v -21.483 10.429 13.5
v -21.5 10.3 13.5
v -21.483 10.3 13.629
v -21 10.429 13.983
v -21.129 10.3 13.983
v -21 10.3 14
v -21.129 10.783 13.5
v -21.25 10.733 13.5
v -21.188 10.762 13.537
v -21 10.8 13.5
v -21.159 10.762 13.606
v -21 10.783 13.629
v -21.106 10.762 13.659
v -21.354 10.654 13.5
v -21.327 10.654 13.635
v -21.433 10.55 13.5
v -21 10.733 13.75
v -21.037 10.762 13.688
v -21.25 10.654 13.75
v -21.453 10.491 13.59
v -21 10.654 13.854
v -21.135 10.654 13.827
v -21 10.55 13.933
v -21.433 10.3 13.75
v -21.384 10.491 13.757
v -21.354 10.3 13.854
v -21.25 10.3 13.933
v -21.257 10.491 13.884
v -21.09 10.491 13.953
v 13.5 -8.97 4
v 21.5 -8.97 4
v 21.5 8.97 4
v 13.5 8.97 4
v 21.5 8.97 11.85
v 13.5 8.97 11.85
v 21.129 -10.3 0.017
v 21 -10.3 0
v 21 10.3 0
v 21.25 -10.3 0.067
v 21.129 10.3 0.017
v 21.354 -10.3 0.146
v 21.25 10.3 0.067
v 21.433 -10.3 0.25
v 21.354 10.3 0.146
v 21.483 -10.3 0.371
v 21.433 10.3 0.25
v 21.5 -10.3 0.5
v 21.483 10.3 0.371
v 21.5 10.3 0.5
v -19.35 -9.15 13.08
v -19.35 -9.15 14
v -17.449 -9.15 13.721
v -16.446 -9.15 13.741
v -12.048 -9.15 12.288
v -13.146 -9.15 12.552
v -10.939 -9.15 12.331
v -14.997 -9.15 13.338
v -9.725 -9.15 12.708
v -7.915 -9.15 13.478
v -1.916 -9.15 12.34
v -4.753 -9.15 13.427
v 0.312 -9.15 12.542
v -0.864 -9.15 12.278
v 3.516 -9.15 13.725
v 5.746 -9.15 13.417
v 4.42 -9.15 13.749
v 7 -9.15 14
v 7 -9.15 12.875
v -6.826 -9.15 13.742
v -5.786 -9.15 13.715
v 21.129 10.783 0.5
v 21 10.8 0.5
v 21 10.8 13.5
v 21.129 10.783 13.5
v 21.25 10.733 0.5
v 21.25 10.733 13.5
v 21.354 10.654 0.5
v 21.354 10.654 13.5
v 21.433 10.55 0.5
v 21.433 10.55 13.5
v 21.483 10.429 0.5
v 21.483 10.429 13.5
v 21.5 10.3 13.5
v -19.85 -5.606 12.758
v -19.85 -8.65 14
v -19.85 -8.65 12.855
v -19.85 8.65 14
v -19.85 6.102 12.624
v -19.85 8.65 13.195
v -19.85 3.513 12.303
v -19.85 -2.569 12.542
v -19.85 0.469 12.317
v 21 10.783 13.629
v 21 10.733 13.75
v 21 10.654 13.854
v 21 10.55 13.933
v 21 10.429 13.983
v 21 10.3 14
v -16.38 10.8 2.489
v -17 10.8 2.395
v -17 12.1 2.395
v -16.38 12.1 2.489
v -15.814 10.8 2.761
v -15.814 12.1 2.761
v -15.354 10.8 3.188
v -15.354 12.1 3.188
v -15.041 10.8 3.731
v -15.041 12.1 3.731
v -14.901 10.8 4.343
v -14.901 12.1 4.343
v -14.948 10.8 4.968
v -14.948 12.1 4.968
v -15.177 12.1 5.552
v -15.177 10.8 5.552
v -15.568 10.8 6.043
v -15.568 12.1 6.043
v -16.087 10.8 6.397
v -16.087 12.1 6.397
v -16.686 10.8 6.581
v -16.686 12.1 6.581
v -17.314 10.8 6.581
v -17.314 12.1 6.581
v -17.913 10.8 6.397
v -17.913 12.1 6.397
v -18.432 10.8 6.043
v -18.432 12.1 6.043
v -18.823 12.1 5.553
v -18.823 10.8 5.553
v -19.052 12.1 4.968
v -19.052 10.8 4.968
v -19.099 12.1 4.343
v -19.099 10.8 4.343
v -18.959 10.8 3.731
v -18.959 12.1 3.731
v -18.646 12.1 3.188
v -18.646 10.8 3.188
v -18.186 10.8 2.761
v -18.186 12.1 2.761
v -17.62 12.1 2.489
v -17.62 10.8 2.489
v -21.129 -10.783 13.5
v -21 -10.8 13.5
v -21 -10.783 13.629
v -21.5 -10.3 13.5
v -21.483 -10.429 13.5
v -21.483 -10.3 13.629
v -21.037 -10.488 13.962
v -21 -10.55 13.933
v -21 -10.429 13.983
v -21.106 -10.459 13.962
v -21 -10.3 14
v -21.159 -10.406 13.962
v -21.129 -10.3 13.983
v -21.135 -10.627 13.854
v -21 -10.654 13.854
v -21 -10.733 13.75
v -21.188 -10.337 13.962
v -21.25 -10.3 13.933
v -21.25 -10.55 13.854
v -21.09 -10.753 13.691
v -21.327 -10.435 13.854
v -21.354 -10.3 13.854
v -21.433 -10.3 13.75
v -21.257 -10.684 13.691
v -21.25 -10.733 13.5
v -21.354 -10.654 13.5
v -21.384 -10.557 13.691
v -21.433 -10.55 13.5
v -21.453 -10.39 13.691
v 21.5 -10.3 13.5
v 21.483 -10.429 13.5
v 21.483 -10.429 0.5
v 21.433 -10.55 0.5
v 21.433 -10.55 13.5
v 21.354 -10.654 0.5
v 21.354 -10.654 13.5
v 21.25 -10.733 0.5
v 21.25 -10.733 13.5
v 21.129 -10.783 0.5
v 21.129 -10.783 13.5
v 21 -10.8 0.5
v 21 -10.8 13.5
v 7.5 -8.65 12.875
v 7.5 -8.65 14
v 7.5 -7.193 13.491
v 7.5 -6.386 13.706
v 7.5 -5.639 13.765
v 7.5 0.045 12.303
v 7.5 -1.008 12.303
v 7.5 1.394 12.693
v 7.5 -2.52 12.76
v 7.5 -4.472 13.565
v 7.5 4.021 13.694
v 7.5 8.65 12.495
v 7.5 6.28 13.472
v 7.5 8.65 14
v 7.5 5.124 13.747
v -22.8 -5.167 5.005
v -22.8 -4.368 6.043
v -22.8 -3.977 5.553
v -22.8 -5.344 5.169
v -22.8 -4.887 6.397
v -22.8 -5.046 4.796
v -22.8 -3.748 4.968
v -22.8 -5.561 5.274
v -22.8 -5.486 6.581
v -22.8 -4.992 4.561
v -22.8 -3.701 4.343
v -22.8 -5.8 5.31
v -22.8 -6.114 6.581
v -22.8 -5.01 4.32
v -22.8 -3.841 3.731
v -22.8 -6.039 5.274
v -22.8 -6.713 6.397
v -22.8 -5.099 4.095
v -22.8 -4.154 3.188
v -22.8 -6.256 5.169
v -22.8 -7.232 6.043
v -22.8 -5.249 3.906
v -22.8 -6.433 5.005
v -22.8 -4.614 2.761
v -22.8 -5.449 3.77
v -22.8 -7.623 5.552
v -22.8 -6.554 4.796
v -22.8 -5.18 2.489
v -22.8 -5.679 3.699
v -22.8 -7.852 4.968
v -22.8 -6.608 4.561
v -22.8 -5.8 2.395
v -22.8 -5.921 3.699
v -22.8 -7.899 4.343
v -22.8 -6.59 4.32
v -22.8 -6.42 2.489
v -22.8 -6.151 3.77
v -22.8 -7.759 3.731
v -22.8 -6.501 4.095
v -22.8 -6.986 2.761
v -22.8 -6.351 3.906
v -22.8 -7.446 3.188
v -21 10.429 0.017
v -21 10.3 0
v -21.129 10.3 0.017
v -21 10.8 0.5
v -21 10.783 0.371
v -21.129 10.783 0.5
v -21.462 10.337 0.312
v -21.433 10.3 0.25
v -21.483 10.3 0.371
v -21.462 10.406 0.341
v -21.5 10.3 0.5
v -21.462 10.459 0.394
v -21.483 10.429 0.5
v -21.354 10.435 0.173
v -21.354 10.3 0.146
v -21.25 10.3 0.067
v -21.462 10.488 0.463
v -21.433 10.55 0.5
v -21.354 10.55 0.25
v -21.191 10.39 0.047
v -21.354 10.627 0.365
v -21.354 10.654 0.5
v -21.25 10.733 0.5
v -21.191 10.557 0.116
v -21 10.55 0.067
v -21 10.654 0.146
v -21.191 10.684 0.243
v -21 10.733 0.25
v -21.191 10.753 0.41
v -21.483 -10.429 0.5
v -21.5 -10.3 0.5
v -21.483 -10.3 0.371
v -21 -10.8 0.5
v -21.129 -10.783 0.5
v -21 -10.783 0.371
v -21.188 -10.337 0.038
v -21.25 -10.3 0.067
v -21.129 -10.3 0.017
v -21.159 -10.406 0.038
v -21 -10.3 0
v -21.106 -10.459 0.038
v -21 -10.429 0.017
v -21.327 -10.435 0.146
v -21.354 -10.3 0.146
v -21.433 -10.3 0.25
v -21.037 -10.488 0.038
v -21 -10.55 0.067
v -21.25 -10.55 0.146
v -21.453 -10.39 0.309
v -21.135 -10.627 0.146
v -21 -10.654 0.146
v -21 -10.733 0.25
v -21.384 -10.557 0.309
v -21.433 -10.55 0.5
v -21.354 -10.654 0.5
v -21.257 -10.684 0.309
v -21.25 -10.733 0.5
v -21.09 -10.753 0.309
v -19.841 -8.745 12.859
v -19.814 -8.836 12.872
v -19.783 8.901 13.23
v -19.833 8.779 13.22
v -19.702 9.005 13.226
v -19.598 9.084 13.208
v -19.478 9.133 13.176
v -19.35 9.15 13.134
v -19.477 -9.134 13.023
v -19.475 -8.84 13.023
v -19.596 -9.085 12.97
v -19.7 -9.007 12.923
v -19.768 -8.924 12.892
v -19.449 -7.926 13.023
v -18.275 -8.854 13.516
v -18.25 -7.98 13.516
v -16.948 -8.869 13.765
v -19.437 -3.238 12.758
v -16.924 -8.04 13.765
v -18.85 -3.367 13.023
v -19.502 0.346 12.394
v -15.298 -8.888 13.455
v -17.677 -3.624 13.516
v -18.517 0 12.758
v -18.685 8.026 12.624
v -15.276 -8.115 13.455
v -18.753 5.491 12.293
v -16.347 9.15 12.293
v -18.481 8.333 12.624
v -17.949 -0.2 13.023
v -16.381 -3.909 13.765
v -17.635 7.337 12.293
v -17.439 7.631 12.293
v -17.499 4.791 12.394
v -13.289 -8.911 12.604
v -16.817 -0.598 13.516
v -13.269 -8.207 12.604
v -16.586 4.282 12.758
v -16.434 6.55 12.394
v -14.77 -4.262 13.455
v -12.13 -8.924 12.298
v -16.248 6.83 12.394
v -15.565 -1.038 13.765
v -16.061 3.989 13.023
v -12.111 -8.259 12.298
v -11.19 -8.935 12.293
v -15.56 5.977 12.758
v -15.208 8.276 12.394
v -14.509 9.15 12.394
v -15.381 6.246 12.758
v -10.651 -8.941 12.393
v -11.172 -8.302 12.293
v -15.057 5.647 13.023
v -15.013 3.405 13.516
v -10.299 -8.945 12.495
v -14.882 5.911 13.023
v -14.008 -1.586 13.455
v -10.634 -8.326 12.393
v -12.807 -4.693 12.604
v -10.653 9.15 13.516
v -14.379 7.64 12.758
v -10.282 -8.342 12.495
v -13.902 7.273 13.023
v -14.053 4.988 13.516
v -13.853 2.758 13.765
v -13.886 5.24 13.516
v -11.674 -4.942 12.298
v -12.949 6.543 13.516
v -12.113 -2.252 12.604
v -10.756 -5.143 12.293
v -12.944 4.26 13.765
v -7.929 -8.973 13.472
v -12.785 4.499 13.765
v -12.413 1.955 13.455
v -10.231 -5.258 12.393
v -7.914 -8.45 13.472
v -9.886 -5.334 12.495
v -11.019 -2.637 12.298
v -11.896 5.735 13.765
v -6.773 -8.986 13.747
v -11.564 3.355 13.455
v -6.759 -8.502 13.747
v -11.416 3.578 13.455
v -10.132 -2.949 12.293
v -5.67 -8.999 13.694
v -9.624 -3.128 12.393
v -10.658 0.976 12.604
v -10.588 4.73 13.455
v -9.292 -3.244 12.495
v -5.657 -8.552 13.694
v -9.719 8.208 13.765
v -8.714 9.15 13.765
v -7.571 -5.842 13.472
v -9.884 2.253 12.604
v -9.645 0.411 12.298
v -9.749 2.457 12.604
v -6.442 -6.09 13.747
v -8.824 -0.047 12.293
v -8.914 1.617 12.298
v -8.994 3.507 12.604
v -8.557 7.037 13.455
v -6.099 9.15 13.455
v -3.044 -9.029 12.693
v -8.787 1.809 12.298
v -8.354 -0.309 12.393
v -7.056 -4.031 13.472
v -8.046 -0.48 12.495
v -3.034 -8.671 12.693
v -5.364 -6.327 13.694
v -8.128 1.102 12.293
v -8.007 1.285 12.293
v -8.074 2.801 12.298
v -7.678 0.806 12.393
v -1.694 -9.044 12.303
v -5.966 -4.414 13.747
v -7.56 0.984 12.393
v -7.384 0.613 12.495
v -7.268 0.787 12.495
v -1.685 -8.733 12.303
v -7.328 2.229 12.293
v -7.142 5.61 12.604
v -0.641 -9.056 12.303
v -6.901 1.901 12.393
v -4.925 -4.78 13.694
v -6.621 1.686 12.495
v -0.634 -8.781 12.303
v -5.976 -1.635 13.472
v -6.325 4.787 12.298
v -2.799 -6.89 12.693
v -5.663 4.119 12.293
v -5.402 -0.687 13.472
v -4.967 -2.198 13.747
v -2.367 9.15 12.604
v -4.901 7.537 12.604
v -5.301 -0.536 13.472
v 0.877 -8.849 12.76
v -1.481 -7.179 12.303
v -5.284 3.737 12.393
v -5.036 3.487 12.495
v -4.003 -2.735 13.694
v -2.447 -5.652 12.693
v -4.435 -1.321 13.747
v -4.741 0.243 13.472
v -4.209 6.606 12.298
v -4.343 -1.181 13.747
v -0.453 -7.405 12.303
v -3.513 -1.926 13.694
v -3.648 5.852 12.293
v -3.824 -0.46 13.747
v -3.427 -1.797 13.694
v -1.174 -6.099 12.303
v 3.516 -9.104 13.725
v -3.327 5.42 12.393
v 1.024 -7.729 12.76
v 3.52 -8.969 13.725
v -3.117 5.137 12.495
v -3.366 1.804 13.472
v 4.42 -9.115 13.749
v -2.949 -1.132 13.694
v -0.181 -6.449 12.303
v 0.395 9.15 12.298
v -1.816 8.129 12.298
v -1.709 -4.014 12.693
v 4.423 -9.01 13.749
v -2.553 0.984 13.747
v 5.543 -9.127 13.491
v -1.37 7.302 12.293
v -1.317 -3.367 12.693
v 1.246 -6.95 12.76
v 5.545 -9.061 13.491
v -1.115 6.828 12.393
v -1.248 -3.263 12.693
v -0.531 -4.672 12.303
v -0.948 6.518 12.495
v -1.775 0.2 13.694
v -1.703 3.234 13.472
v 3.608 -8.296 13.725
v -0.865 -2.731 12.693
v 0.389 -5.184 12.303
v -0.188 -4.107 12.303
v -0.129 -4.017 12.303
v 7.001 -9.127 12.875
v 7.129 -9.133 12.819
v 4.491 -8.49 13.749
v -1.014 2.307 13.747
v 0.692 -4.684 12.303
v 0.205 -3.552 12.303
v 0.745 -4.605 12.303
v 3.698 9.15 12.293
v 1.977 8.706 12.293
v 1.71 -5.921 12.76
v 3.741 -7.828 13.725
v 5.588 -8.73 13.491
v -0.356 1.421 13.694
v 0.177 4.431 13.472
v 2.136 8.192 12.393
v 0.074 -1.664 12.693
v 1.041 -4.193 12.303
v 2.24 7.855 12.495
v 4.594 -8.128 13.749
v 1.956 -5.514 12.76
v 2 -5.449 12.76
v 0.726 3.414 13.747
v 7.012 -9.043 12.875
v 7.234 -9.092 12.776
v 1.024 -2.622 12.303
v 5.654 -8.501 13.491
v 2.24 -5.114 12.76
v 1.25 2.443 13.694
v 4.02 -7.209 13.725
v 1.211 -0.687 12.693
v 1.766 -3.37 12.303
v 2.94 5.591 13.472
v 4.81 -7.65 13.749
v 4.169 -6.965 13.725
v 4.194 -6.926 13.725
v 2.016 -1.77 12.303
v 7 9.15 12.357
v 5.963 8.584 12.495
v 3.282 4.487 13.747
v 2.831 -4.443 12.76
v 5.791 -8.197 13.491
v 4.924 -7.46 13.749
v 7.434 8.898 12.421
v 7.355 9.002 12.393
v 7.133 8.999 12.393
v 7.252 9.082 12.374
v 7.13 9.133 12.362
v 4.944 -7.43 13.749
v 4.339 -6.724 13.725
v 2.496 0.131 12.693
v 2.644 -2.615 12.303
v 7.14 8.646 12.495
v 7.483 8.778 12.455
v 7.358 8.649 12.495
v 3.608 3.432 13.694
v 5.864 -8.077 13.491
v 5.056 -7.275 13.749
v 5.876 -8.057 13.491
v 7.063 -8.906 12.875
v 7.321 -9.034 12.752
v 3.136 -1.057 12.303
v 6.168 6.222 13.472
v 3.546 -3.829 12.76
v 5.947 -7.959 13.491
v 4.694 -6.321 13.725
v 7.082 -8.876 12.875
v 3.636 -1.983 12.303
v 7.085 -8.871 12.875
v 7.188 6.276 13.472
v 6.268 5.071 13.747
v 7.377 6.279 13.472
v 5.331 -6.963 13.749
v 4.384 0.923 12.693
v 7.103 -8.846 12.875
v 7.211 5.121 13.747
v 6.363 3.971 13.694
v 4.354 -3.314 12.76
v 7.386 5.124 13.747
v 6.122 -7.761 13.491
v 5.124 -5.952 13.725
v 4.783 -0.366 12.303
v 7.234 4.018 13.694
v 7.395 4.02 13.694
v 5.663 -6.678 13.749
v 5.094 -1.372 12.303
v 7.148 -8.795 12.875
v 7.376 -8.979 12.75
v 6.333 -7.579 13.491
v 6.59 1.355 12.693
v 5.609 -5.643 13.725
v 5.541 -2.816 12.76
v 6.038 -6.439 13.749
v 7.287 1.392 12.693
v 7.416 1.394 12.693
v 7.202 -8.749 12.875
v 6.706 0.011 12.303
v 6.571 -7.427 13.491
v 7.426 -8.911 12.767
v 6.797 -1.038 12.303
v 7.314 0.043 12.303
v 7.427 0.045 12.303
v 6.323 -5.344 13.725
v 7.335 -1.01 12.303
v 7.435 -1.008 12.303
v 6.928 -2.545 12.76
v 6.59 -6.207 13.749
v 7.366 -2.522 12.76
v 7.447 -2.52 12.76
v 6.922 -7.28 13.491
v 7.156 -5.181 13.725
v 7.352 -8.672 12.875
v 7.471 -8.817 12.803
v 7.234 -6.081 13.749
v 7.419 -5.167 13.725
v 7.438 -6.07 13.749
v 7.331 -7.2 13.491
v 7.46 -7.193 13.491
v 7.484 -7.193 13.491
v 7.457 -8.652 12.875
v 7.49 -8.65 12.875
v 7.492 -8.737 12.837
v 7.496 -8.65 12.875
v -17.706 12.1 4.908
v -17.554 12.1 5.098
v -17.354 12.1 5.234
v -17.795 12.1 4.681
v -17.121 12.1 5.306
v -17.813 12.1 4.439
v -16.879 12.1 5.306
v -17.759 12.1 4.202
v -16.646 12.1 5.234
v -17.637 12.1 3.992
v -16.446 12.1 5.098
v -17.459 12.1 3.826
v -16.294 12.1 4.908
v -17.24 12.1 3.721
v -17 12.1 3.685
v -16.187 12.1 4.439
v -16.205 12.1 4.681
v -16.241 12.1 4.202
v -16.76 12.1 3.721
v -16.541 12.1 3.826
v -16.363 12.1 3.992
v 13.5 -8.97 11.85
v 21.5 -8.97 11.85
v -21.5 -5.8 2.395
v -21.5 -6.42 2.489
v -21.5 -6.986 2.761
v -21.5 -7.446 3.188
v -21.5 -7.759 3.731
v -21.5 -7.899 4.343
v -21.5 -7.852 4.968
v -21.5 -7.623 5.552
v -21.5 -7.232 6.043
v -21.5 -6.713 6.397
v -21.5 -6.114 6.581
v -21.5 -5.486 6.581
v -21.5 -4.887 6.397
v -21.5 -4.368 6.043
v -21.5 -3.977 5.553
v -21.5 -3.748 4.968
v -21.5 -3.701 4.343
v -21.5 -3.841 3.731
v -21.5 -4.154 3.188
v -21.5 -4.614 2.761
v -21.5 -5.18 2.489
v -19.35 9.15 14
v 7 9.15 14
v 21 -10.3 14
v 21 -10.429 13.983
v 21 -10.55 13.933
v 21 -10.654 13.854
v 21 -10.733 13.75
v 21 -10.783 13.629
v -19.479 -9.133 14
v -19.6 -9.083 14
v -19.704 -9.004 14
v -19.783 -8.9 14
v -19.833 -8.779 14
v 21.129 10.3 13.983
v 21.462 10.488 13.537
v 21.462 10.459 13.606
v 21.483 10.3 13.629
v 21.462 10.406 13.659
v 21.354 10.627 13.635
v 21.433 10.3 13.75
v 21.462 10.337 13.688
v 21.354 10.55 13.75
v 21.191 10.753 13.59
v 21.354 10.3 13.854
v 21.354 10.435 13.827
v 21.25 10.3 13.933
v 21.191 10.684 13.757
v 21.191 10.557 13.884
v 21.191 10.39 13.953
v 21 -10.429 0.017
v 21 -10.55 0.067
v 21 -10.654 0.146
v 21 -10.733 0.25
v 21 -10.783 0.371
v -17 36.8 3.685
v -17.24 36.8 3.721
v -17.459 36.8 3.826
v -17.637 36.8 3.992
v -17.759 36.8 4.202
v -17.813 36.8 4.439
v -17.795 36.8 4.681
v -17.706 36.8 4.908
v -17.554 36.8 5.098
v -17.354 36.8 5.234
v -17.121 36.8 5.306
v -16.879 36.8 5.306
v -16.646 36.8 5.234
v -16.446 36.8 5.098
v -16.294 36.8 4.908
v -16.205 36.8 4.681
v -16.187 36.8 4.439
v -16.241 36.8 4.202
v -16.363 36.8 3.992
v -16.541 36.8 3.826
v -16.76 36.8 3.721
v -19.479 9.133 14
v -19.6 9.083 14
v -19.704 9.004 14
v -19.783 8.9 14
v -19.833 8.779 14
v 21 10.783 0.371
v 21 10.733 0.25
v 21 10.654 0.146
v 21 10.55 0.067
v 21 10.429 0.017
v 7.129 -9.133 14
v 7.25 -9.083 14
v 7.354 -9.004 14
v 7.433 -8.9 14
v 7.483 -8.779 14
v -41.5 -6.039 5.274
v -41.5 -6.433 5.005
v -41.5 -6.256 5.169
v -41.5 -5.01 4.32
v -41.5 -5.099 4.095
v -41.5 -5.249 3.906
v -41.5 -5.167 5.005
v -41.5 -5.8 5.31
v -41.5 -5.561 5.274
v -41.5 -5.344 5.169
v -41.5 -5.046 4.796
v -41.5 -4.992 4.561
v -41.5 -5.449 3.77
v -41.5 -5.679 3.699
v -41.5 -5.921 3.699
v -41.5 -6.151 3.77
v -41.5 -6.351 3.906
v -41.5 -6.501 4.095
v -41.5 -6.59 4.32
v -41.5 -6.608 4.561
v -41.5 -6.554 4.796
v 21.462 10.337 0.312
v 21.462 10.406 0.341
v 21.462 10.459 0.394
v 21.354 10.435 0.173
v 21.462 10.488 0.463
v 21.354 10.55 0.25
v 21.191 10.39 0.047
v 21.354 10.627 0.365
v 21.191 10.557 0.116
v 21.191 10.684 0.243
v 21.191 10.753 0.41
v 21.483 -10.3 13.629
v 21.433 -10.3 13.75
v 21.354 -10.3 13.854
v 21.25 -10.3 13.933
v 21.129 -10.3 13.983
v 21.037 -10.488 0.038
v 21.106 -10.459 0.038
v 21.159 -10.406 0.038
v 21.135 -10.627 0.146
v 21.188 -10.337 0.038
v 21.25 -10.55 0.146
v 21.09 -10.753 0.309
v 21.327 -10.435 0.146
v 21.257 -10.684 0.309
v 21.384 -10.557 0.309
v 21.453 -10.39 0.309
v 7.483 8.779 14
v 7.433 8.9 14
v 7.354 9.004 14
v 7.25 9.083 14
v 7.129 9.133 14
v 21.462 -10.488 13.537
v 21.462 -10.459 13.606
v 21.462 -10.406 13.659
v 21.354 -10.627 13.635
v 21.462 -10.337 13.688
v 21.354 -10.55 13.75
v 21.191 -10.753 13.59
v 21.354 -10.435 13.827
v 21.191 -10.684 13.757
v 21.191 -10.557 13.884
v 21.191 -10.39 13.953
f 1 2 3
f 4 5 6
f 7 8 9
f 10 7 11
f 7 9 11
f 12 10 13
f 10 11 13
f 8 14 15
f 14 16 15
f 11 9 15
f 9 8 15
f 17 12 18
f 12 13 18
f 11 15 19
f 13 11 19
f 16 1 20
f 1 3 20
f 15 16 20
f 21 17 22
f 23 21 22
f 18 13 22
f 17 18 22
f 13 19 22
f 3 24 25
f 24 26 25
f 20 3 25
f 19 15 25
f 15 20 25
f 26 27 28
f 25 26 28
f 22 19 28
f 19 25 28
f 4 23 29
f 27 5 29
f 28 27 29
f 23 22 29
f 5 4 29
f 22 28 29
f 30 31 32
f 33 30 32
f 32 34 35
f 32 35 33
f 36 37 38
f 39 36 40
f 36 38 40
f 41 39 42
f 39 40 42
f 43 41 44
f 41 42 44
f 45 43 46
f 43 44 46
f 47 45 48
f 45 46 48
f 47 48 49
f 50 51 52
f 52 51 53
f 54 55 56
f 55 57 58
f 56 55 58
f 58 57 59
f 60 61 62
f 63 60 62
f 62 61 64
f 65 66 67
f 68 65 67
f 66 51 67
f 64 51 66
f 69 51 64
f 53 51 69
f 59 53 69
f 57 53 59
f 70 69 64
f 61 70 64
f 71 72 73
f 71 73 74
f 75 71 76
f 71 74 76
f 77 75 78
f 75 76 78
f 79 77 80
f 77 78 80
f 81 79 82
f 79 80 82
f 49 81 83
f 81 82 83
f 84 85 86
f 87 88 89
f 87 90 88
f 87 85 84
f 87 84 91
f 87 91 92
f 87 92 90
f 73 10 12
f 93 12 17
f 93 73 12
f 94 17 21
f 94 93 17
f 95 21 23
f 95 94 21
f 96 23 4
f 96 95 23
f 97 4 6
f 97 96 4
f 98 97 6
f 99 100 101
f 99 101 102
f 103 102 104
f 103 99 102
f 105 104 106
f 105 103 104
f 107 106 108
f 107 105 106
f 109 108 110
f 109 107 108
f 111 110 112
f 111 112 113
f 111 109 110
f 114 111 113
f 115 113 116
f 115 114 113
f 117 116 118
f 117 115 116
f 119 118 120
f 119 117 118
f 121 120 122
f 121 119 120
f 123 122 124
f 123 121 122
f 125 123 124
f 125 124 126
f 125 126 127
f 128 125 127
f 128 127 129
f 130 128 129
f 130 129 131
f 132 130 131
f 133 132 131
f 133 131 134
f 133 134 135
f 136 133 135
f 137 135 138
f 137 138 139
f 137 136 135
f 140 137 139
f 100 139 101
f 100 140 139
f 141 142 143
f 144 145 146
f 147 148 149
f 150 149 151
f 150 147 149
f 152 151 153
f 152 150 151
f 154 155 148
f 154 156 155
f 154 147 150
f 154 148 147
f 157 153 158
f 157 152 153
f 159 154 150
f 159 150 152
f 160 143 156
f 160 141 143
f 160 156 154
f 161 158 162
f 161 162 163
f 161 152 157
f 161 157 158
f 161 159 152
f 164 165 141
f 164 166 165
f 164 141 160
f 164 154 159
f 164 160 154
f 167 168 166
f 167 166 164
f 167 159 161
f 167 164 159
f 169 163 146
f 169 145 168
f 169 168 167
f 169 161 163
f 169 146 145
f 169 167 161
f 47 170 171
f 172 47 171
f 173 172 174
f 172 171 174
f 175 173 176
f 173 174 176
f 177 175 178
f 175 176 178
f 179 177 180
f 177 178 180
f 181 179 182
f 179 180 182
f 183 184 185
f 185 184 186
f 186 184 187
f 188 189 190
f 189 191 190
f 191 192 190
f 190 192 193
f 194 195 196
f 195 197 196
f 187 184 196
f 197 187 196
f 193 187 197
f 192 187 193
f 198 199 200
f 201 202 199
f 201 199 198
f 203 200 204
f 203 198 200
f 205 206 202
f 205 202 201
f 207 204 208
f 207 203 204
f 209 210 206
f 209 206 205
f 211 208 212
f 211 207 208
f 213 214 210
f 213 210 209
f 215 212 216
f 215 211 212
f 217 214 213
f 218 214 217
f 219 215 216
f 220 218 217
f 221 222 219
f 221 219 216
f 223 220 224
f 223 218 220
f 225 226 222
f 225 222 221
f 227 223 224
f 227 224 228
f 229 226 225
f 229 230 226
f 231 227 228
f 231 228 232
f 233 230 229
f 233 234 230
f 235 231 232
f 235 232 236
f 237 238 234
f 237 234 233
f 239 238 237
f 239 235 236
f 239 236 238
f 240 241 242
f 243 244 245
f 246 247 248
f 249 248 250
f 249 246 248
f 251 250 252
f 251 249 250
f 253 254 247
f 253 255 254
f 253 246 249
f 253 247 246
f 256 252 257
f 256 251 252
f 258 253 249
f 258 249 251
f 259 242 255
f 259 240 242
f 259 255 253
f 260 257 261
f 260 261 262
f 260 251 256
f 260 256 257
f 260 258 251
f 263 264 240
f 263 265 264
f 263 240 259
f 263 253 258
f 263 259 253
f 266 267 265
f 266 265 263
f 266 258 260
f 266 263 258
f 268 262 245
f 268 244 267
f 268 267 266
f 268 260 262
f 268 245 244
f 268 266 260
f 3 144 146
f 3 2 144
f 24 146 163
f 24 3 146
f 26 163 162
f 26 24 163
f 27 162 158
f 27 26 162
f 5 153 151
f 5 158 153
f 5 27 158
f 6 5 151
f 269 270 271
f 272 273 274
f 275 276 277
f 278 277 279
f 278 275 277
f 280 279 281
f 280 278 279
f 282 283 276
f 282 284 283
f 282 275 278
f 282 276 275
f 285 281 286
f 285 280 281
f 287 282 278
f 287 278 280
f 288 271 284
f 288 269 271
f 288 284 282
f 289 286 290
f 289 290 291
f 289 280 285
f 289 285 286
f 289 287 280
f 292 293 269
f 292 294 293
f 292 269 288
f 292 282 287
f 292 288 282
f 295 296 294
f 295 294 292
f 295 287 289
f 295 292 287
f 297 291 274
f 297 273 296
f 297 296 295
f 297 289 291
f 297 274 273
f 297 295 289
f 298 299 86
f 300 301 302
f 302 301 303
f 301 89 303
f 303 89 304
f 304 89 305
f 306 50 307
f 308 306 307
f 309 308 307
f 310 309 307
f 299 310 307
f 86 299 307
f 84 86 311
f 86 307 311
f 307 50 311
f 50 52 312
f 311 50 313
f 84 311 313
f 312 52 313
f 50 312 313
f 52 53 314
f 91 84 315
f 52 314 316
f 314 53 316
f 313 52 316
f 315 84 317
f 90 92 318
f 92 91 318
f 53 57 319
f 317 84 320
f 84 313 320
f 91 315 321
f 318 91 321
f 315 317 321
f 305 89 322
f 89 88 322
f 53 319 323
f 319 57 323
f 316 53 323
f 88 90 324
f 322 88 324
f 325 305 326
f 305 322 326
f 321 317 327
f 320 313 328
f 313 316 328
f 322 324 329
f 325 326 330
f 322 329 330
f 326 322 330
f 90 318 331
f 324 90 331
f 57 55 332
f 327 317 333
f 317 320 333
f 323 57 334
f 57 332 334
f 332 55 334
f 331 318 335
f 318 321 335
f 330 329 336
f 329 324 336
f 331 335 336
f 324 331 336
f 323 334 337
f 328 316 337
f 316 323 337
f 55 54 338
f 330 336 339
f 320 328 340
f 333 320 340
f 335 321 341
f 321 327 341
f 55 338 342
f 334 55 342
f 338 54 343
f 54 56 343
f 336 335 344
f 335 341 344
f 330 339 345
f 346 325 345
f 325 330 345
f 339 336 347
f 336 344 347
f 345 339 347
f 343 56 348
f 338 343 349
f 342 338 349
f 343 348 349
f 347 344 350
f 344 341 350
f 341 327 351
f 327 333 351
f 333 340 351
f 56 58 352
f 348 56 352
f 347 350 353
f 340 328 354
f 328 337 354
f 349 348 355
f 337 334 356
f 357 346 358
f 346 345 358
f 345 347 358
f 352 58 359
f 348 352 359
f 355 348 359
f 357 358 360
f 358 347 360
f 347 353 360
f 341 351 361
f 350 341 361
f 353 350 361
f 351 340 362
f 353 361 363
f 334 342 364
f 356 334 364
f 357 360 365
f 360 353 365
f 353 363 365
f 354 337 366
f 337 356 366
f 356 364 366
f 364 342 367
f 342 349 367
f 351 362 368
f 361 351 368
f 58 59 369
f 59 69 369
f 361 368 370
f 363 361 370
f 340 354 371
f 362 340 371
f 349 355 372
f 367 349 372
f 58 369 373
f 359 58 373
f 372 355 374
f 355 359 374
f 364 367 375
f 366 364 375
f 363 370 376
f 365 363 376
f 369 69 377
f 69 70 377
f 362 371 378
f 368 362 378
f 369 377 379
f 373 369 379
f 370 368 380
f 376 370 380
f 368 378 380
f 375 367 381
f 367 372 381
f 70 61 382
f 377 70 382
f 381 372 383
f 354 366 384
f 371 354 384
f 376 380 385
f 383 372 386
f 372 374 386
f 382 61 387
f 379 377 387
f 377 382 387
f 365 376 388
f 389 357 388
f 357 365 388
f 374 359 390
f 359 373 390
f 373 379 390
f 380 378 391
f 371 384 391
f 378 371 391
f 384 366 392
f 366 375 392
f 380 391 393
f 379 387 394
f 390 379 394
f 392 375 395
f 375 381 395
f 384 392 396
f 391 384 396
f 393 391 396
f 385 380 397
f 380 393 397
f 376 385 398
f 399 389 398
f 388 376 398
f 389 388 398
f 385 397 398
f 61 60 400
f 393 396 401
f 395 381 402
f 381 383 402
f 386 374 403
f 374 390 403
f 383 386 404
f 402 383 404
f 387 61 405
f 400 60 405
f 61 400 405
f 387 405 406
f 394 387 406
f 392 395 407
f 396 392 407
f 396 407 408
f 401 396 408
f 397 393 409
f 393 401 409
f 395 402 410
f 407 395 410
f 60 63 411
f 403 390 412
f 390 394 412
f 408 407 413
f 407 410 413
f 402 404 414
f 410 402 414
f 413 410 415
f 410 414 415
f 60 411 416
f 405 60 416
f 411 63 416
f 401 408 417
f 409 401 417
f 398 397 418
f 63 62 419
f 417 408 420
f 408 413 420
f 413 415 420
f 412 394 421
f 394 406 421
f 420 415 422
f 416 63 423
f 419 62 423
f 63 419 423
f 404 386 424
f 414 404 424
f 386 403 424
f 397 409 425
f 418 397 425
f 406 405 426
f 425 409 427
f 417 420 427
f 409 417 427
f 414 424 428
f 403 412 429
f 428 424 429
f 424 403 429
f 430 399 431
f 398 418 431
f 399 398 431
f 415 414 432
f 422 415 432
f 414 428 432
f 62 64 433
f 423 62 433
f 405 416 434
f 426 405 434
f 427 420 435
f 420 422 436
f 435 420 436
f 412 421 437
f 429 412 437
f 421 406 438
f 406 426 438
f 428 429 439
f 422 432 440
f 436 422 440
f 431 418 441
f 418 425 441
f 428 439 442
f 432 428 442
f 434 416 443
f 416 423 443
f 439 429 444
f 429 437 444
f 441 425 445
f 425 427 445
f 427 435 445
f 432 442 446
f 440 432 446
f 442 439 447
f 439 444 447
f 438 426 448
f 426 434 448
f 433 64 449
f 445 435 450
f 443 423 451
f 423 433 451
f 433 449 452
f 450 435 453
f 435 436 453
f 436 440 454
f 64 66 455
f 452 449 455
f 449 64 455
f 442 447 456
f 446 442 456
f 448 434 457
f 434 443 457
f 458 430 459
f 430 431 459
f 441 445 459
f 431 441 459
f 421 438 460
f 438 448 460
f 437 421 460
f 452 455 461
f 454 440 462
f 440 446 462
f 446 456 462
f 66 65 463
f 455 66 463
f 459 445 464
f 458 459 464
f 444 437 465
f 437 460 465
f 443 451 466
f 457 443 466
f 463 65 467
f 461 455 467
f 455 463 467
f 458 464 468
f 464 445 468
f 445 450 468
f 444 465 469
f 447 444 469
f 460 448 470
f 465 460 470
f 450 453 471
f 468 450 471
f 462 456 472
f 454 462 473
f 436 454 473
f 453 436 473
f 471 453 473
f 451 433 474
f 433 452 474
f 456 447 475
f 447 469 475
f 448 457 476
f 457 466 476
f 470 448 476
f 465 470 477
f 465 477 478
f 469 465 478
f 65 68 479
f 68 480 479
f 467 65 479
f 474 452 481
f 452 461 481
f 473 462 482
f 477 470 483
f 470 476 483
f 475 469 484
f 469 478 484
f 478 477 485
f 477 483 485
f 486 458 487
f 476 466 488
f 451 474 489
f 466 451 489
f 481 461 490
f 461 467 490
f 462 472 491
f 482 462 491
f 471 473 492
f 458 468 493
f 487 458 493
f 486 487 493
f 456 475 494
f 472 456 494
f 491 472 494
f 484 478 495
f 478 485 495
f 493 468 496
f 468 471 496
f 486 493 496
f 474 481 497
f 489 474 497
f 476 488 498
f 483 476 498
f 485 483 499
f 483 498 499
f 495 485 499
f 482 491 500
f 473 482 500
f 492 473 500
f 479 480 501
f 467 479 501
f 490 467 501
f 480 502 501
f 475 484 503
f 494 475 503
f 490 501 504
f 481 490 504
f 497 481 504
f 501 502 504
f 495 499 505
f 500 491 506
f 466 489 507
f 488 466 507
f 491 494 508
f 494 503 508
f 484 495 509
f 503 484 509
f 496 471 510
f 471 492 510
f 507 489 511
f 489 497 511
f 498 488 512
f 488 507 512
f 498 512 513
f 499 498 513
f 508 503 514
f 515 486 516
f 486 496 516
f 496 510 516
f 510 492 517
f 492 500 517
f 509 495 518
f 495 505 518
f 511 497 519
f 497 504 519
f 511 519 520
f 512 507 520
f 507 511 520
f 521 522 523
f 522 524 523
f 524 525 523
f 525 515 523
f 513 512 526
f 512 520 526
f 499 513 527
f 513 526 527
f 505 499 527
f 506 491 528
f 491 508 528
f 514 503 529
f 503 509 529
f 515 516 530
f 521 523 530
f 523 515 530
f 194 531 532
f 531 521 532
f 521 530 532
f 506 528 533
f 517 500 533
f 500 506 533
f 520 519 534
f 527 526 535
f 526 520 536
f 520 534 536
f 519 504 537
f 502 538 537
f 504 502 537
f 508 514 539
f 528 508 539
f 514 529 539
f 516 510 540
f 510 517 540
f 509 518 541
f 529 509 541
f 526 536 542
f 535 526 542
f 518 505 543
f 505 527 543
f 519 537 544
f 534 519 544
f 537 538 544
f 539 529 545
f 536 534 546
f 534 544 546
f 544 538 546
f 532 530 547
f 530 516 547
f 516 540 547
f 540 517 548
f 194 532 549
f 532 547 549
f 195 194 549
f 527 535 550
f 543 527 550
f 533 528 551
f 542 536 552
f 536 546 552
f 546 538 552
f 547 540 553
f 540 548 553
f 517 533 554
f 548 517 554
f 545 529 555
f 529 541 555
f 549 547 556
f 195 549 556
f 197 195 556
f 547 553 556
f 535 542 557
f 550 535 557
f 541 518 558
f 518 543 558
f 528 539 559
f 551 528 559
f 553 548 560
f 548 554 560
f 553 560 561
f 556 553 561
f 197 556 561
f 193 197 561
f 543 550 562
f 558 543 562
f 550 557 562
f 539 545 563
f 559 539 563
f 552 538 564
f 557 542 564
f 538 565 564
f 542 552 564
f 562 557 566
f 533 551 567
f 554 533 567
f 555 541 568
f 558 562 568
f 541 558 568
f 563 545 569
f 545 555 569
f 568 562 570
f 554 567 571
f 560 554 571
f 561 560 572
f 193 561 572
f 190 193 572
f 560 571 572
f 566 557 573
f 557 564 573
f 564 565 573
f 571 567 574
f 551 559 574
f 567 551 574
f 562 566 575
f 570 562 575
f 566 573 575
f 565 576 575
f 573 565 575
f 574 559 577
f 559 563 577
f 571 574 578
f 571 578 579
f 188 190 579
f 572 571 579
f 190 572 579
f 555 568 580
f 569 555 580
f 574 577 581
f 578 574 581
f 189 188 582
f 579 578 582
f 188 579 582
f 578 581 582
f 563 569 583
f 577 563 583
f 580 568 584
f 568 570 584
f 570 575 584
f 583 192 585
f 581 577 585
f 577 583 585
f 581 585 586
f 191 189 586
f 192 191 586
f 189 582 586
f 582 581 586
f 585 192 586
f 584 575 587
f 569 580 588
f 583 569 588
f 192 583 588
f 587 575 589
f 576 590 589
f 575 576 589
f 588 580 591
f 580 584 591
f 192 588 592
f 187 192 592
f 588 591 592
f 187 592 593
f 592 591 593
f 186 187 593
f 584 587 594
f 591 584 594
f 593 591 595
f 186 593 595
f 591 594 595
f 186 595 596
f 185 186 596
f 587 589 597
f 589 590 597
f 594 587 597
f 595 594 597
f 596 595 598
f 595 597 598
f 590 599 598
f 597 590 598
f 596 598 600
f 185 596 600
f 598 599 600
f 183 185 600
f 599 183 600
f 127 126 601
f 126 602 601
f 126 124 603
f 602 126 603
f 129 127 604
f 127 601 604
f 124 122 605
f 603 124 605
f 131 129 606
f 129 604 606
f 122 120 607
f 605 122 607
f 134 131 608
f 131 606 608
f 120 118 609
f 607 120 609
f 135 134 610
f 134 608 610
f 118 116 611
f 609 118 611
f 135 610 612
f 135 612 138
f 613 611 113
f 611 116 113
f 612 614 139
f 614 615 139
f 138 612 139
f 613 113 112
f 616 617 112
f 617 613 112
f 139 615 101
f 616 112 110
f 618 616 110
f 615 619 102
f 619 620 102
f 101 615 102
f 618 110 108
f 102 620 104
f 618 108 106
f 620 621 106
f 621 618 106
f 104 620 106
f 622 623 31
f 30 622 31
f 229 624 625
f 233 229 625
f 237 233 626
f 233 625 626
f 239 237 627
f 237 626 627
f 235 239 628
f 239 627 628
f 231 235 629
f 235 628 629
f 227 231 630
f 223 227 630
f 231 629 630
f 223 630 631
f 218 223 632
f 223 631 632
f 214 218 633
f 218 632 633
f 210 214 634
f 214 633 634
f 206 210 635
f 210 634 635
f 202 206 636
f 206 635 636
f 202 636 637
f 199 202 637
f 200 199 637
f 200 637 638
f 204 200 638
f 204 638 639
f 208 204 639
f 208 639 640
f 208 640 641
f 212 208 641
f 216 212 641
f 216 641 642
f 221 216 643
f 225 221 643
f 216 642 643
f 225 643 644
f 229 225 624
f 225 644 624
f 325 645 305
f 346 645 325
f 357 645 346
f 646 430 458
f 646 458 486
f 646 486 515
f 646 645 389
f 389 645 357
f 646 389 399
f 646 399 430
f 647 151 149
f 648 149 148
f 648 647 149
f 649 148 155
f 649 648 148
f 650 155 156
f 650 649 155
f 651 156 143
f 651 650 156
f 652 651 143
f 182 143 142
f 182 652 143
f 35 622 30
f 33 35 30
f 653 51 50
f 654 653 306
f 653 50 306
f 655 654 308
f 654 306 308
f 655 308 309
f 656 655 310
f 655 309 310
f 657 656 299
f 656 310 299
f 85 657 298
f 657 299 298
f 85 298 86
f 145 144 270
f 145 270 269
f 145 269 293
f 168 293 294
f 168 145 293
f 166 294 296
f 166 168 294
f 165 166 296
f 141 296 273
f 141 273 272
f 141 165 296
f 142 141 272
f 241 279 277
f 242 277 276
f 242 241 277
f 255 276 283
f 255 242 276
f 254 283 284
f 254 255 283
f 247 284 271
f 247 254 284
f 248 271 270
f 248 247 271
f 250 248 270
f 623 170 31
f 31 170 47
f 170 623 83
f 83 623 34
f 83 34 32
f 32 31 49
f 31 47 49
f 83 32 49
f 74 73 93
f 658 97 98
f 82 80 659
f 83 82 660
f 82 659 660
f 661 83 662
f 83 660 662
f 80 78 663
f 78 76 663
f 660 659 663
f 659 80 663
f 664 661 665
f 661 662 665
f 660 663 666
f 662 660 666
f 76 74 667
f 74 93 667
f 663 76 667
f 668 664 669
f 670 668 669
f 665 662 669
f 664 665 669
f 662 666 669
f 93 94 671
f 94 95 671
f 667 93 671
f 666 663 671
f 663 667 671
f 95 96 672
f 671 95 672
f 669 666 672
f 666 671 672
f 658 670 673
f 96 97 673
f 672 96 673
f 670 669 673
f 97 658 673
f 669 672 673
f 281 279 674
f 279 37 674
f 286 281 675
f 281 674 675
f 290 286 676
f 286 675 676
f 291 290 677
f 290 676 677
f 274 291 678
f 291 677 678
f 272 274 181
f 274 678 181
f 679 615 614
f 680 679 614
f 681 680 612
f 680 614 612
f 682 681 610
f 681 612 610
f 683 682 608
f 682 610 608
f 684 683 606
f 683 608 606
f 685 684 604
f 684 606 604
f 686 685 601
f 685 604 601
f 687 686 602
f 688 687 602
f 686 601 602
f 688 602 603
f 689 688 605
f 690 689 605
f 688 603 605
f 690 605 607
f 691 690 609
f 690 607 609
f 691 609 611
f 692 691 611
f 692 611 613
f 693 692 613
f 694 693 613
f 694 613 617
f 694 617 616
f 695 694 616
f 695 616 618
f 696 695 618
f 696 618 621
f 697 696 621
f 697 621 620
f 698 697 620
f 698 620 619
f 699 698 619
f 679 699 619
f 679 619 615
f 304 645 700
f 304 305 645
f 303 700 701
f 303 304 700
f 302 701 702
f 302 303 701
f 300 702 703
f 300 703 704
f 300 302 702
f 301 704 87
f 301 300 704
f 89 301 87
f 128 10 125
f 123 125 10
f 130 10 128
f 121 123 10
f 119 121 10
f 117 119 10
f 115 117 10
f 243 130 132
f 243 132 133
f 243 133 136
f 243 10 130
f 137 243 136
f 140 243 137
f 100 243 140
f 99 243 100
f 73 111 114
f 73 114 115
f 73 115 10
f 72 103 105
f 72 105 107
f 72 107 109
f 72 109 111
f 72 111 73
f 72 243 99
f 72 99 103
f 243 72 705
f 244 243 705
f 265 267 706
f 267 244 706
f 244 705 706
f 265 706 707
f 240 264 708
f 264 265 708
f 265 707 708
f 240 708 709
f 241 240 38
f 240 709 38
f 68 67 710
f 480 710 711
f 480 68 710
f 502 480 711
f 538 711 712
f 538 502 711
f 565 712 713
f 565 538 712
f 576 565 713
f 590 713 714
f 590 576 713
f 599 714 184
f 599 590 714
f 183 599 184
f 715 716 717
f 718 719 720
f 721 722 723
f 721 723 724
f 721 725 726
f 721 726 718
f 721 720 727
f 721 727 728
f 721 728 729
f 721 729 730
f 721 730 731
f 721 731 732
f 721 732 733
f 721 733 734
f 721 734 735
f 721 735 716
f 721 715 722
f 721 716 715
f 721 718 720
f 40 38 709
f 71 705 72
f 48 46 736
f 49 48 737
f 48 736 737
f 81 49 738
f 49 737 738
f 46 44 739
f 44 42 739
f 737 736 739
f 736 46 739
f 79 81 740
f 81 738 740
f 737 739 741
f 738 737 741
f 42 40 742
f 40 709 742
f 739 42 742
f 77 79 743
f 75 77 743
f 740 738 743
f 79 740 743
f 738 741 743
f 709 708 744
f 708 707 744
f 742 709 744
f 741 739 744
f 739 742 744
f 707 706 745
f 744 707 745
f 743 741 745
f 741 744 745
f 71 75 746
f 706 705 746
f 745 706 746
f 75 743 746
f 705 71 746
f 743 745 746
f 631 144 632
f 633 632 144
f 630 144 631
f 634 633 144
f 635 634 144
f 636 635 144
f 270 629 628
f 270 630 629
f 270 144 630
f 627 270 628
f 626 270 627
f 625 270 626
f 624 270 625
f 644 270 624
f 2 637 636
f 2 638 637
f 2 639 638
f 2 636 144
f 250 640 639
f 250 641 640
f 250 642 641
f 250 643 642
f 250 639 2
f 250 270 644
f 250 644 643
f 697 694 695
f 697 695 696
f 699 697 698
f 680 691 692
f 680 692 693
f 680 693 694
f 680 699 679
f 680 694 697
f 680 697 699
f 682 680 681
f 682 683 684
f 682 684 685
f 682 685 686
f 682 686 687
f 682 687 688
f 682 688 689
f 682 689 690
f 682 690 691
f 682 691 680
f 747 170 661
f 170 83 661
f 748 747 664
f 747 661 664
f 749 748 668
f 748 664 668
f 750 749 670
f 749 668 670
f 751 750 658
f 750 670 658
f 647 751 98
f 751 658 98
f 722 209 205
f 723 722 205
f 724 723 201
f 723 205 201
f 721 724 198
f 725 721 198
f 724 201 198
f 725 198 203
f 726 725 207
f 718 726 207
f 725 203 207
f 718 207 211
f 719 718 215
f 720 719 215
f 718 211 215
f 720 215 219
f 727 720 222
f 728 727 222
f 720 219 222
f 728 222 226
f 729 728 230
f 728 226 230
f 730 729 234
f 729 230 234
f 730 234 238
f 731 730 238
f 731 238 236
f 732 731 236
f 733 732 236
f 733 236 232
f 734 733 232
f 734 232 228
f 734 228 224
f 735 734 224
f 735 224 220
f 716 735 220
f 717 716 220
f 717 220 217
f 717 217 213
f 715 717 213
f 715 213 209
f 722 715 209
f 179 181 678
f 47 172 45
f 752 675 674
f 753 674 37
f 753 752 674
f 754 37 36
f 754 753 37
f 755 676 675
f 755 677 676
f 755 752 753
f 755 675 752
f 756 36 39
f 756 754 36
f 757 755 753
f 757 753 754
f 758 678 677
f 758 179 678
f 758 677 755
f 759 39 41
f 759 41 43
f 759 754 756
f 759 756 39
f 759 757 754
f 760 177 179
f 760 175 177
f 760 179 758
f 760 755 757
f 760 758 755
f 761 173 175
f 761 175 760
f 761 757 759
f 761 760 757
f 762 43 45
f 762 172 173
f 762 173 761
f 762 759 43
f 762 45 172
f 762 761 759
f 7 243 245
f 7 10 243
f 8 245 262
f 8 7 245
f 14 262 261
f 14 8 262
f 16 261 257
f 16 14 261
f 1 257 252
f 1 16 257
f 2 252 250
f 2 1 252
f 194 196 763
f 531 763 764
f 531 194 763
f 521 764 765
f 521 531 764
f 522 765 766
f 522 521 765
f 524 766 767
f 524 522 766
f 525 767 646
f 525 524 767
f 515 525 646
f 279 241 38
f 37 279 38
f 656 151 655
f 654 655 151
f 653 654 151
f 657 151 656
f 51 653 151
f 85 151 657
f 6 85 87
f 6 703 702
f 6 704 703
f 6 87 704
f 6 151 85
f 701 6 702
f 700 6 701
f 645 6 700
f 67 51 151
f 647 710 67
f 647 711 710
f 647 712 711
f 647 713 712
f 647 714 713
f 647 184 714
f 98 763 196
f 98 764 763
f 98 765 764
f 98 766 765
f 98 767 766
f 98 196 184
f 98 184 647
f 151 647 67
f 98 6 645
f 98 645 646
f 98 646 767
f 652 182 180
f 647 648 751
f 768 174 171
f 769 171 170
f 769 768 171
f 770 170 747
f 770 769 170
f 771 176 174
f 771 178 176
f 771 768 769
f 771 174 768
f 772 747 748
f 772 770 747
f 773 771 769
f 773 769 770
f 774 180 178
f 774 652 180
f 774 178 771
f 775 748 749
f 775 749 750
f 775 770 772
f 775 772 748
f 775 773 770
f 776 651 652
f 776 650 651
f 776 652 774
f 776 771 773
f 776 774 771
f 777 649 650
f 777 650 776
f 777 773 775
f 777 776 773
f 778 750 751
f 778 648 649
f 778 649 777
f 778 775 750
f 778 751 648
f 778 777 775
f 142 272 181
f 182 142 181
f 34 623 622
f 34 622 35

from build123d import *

# Parameters (mm, degrees)
SKETCH1_W           = 43
SKETCH1_H           = 21.6
BOSS_EXTRUDE1_DEPTH = 14
SKETCH2_W           = 27.35
SKETCH2_H           = 18.3
CUT_EXTRUDE1_DEPTH  = 2
SKETCH3_W           = 7.85
SKETCH3_H           = 17.94
CUT_EXTRUDE2_DEPTH  = 8
REVOLVE2_ANGLE      = 90
SKETCH5_W           = 92.23581066
SKETCH5_H           = 73.43389541
SKETCH5_W_2         = 43
SKETCH5_H_2         = 21.6
CUT_EXTRUDE3_DEPTH  = 23
SKETCH6_R           = 2.105
SKETCH6_R_2         = 0.81
BOSS_EXTRUDE2_DEPTH = 1.3
SKETCH7_R           = 2.105
SKETCH7_R_2         = 0.81
BOSS_EXTRUDE3_DEPTH = 1.3
SKETCH8_R           = 0.81
BOSS_EXTRUDE4_DEPTH = 20
SKETCH9_R           = 0.815150105
BOSS_EXTRUDE5_DEPTH = 26
FILLET1_R           = 0.5


with BuildPart() as part:
    # Sketch1 → Boss-Extrude1 (new body)
    with BuildSketch(Plane.XY):
        Rectangle(SKETCH1_W, SKETCH1_H)
    extrude(amount=BOSS_EXTRUDE1_DEPTH)

    # Sketch2 → Cut-Extrude1 (cut)
    with BuildSketch(Plane.XY.offset(14)):
        with Locations((-6.175, 0)):
            Rectangle(SKETCH2_W, SKETCH2_H)
    extrude(amount=-CUT_EXTRUDE1_DEPTH, mode=Mode.SUBTRACT)

    # Sketch3 → Cut-Extrude2 (cut)
    with BuildSketch(Plane(origin=(21.5, 0, 0), x_dir=(0, 0, -1), z_dir=(1, 0, 0))):
        with Locations((-7.925, 0)):
            Rectangle(SKETCH3_W, SKETCH3_H)
    extrude(amount=-CUT_EXTRUDE2_DEPTH, mode=Mode.SUBTRACT)

    # Sketch4 → Revolve2 (revolve)
    with BuildSketch(Plane(origin=(0, -9.15, 0), x_dir=(1, 0, 0), z_dir=(0, 1, 0))):
        with BuildLine():
            Line((-32.583466089, -10.1469511), (-32.583466089, -12.265551486))
            add(Edge.make_bspline(
                [(-32.583466089, -12.265551486), (-32.562502483, -12.265551486), (-32.520421916, -12.266006033), (-32.4432028, -12.268051491), (-32.333162226, -12.273488053), (-32.204458453, -12.283626191), (-32.058326628, -12.301036433), (-31.883418572, -12.328702131), (-31.686720457, -12.369661846), (-31.491837838, -12.419079982), (-31.298991654, -12.47598715), (-31.074449095, -12.55061405), (-30.819301893, -12.645650497), (-30.534581384, -12.762541391), (-30.220087155, -12.900547222), (-29.829076239, -13.077316326), (-29.358834293, -13.28780702), (-28.785809577, -13.519520804), (-28.090562481, -13.719040931), (-27.293796046, -13.805648084), (-26.419142059, -13.693362453), (-25.49136496, -13.369953032), (-24.502198634, -12.908600866), (-23.392162802, -12.415282136), (-22.124309457, -12.154525407), (-20.858041285, -12.40646563), (-19.751906697, -12.893751072), (-18.769192416, -13.353235169), (-17.846551628, -13.682182536), (-16.973609278, -13.804616553), (-16.009305612, -13.711847073), (-15.005547104, -13.37431948), (-14.04749388, -12.909101), (-13.049418653, -12.482723934), (-12.133440252, -12.262513677), (-11.3353156, -12.242983824), (-10.409800826, -12.421010141), (-9.400945989, -12.826034613), (-8.434871057, -13.30301482), (-7.417140082, -13.675236005), (-6.457099181, -13.803910561), (-5.606473079, -13.72128943), (-4.682813704, -13.427765218), (-3.69904901, -12.975867192), (-2.756532087, -12.543833591), (-1.795314434, -12.273179903), (-0.966070624, -12.243102783), (-0.315946216, -12.343671298), (0.265672195, -12.515998278), (0.783591987, -12.717624267), (1.405691454, -12.993439328), (2.136134729, -13.329294572), (2.847403799, -13.604786677), (3.551966265, -13.750324658), (4.099646321, -13.773217429), (4.475706664, -13.751363619), (4.917058627, -13.680358163), (5.404652636, -13.54933903), (5.879870794, -13.370834982), (6.304903895, -13.187020764), (6.697517429, -13.011274996), (6.938033599, -12.90064266), (7.234652875, -12.773222965), (7.35452597, -12.722686103), (7.41653391, -12.697417231)],
                knots=[0.083339346, 0.083339346, 0.083339346, 0.083339346, 0.083339346, 0.085336612, 0.087333879, 0.089331145, 0.091328411, 0.095322944, 0.099317476, 0.103312008, 0.107306541, 0.111301073, 0.115295606, 0.122119207, 0.128942808, 0.13576641, 0.142590011, 0.156237213, 0.169884416, 0.18488454, 0.199884664, 0.219547445, 0.239210226, 0.26281996, 0.286429695, 0.316430056, 0.339777495, 0.363124933, 0.382799659, 0.402474385, 0.417474496, 0.432474606, 0.459256287, 0.486037969, 0.502278436, 0.518518903, 0.53373395, 0.548948997, 0.576756025, 0.604563053, 0.61956323, 0.634563408, 0.65321264, 0.671861872, 0.696234785, 0.720607698, 0.735607914, 0.750608131, 0.761649817, 0.772691503, 0.783733188, 0.794774874, 0.815713505, 0.836652137, 0.844152286, 0.851652435, 0.859152585, 0.866652734, 0.879411498, 0.892170261, 0.898549642, 0.904929024, 0.911308406, 0.917687787, 0.917687787, 0.917687787, 0.917687787, 0.917687787], degree=4))
            Line((7.41653391, -12.697417231), (7.41653391, -10.1469511))
            Line((7.41653391, -10.1469511), (-32.583466089, -10.1469511))
        make_face()
    revolve(axis=Axis((7.5, -9.15, 12), (0, 0, -1)), revolution_arc=REVOLVE2_ANGLE)

    # Sketch5 → Cut-Extrude3 (cut)
    with BuildSketch(Plane.XY):
        with Locations((3.214998373, 5.833103881)):
            Rectangle(SKETCH5_W, SKETCH5_H)
        Rectangle(SKETCH5_W_2, SKETCH5_H_2, mode=Mode.SUBTRACT)
    extrude(amount=CUT_EXTRUDE3_DEPTH, mode=Mode.SUBTRACT)

    # Sketch6 → Boss-Extrude2 (add)
    with BuildSketch(Plane.ZY.offset(21.5)):
        with Locations(Location((4.5, -5.8, 0), (0, 0, 180))):
            Circle(SKETCH6_R)
        with Locations((4.5, -5.8)):
            Circle(SKETCH6_R_2, mode=Mode.SUBTRACT)
    extrude(amount=BOSS_EXTRUDE2_DEPTH)

    # Sketch7 → Boss-Extrude3 (add)
    with BuildSketch(Plane(origin=(0, 10.8, -10.8), x_dir=(1, 0, 0), z_dir=(0, -1, 0))):
        with Locations(Location((-17, 15.3, 0), (0, 0, 270))):
            Circle(SKETCH7_R)
        with Locations(Location((-17, 15.3, 0), (0, 0, 270))):
            Circle(SKETCH7_R_2, mode=Mode.SUBTRACT)
    extrude(amount=-BOSS_EXTRUDE3_DEPTH)

    # Sketch8 → Boss-Extrude4 (add)
    with BuildSketch(Plane.ZY.offset(21.5)):
        with Locations((4.5, -5.8)):
            Circle(SKETCH8_R)
    extrude(amount=BOSS_EXTRUDE4_DEPTH)

    # Sketch9 → Boss-Extrude5 (add)
    with BuildSketch(Plane(origin=(0, 10.8, 0), x_dir=(1, 0, 0), z_dir=(0, 1, 0))):
        with Locations(Location((-17, -4.5, 0), (0, 0, 90))):
            Circle(SKETCH9_R)
    extrude(amount=BOSS_EXTRUDE5_DEPTH)

    # Fillet1
    fillet1_edges = [part.edges().sort_by_distance(p)[0] for p in [
        (-21.5, -10.8, 7),
        (0, -10.8, 14),
        (21.5, -10.8, 7),
        (0, 10.8, 0),
        (-21.5, 0, 0),
        (0, -10.8, 0),
        (21.5, 0, 0),
        (7.5, -9.15, 13),
        (7.5, 9.15, 13.179370152),
        (-19.85, 9.15, 13.656100765),
        (-19.85, -9.15, 13.428261731),
        (-21.5, 0, 14),
        (-21.5, 10.8, 7),
        (0, 10.8, 14),
        (21.5, 10.8, 7),
        (21.5, 0, 14),
    ]]
    fillet(fillet1_edges, radius=FILLET1_R)


solid = part.part
